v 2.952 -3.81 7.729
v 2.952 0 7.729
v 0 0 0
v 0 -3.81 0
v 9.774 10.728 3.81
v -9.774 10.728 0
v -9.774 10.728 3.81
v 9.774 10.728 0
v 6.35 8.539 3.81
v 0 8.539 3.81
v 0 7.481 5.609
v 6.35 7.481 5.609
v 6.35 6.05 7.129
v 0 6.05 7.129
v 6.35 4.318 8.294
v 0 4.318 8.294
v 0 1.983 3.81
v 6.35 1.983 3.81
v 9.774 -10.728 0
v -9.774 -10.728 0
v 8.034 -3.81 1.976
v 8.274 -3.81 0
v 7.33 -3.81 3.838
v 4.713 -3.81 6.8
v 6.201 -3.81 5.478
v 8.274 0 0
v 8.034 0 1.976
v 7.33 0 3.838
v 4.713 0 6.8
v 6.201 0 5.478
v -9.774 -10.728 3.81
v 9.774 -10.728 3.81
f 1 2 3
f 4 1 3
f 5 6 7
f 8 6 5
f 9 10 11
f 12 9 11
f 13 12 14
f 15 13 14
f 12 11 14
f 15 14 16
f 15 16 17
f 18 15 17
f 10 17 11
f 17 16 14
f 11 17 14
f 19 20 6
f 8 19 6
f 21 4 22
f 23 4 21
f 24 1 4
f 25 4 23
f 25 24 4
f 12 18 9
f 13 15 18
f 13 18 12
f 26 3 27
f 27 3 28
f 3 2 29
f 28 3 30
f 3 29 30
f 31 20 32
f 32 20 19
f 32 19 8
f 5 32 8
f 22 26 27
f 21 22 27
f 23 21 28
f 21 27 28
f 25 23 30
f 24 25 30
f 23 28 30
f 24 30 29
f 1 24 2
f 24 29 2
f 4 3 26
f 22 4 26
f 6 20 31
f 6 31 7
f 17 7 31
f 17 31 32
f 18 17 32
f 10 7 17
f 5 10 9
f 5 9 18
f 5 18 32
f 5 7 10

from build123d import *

# Parameters (mm, degrees)
F0_W     = 19.547974
F0_H     = 21.456248
F1_DEPTH = 3.81
F3_DEPTH = 6.35
F5_DEPTH = 3.81


with BuildPart() as f1:
    # F0 (on Top) → F1 (new body)
    with BuildSketch(Plane.XY):
        Rectangle(F0_W, F0_H)
    extrude(amount=F1_DEPTH)

    # F2 (on Right) → F3 (join)
    with BuildSketch(Plane.YZ):
        with BuildLine():
            ThreePointArc((9.350387, 0), (7.993799, 4.850661), (4.317672, 8.29382))
            Line((4.317672, 8.29382), (0, 0))
            Line((0, 0), (9.350387, 0))
        make_face()
    extrude(amount=F3_DEPTH)


with BuildPart() as f5:
    # F4 (on Front) → F5 (new body)
    with BuildSketch(Plane.XZ):
        with BuildLine():
            ThreePointArc((8.273909, 0), (6.814833, 4.692081), (2.952212, 7.729296))
            Line((2.952212, 7.729296), (0, 0))
            Line((0, 0), (8.273909, 0))
        make_face()
    extrude(amount=F5_DEPTH)


solid = Compound([f1.part, f5.part])
